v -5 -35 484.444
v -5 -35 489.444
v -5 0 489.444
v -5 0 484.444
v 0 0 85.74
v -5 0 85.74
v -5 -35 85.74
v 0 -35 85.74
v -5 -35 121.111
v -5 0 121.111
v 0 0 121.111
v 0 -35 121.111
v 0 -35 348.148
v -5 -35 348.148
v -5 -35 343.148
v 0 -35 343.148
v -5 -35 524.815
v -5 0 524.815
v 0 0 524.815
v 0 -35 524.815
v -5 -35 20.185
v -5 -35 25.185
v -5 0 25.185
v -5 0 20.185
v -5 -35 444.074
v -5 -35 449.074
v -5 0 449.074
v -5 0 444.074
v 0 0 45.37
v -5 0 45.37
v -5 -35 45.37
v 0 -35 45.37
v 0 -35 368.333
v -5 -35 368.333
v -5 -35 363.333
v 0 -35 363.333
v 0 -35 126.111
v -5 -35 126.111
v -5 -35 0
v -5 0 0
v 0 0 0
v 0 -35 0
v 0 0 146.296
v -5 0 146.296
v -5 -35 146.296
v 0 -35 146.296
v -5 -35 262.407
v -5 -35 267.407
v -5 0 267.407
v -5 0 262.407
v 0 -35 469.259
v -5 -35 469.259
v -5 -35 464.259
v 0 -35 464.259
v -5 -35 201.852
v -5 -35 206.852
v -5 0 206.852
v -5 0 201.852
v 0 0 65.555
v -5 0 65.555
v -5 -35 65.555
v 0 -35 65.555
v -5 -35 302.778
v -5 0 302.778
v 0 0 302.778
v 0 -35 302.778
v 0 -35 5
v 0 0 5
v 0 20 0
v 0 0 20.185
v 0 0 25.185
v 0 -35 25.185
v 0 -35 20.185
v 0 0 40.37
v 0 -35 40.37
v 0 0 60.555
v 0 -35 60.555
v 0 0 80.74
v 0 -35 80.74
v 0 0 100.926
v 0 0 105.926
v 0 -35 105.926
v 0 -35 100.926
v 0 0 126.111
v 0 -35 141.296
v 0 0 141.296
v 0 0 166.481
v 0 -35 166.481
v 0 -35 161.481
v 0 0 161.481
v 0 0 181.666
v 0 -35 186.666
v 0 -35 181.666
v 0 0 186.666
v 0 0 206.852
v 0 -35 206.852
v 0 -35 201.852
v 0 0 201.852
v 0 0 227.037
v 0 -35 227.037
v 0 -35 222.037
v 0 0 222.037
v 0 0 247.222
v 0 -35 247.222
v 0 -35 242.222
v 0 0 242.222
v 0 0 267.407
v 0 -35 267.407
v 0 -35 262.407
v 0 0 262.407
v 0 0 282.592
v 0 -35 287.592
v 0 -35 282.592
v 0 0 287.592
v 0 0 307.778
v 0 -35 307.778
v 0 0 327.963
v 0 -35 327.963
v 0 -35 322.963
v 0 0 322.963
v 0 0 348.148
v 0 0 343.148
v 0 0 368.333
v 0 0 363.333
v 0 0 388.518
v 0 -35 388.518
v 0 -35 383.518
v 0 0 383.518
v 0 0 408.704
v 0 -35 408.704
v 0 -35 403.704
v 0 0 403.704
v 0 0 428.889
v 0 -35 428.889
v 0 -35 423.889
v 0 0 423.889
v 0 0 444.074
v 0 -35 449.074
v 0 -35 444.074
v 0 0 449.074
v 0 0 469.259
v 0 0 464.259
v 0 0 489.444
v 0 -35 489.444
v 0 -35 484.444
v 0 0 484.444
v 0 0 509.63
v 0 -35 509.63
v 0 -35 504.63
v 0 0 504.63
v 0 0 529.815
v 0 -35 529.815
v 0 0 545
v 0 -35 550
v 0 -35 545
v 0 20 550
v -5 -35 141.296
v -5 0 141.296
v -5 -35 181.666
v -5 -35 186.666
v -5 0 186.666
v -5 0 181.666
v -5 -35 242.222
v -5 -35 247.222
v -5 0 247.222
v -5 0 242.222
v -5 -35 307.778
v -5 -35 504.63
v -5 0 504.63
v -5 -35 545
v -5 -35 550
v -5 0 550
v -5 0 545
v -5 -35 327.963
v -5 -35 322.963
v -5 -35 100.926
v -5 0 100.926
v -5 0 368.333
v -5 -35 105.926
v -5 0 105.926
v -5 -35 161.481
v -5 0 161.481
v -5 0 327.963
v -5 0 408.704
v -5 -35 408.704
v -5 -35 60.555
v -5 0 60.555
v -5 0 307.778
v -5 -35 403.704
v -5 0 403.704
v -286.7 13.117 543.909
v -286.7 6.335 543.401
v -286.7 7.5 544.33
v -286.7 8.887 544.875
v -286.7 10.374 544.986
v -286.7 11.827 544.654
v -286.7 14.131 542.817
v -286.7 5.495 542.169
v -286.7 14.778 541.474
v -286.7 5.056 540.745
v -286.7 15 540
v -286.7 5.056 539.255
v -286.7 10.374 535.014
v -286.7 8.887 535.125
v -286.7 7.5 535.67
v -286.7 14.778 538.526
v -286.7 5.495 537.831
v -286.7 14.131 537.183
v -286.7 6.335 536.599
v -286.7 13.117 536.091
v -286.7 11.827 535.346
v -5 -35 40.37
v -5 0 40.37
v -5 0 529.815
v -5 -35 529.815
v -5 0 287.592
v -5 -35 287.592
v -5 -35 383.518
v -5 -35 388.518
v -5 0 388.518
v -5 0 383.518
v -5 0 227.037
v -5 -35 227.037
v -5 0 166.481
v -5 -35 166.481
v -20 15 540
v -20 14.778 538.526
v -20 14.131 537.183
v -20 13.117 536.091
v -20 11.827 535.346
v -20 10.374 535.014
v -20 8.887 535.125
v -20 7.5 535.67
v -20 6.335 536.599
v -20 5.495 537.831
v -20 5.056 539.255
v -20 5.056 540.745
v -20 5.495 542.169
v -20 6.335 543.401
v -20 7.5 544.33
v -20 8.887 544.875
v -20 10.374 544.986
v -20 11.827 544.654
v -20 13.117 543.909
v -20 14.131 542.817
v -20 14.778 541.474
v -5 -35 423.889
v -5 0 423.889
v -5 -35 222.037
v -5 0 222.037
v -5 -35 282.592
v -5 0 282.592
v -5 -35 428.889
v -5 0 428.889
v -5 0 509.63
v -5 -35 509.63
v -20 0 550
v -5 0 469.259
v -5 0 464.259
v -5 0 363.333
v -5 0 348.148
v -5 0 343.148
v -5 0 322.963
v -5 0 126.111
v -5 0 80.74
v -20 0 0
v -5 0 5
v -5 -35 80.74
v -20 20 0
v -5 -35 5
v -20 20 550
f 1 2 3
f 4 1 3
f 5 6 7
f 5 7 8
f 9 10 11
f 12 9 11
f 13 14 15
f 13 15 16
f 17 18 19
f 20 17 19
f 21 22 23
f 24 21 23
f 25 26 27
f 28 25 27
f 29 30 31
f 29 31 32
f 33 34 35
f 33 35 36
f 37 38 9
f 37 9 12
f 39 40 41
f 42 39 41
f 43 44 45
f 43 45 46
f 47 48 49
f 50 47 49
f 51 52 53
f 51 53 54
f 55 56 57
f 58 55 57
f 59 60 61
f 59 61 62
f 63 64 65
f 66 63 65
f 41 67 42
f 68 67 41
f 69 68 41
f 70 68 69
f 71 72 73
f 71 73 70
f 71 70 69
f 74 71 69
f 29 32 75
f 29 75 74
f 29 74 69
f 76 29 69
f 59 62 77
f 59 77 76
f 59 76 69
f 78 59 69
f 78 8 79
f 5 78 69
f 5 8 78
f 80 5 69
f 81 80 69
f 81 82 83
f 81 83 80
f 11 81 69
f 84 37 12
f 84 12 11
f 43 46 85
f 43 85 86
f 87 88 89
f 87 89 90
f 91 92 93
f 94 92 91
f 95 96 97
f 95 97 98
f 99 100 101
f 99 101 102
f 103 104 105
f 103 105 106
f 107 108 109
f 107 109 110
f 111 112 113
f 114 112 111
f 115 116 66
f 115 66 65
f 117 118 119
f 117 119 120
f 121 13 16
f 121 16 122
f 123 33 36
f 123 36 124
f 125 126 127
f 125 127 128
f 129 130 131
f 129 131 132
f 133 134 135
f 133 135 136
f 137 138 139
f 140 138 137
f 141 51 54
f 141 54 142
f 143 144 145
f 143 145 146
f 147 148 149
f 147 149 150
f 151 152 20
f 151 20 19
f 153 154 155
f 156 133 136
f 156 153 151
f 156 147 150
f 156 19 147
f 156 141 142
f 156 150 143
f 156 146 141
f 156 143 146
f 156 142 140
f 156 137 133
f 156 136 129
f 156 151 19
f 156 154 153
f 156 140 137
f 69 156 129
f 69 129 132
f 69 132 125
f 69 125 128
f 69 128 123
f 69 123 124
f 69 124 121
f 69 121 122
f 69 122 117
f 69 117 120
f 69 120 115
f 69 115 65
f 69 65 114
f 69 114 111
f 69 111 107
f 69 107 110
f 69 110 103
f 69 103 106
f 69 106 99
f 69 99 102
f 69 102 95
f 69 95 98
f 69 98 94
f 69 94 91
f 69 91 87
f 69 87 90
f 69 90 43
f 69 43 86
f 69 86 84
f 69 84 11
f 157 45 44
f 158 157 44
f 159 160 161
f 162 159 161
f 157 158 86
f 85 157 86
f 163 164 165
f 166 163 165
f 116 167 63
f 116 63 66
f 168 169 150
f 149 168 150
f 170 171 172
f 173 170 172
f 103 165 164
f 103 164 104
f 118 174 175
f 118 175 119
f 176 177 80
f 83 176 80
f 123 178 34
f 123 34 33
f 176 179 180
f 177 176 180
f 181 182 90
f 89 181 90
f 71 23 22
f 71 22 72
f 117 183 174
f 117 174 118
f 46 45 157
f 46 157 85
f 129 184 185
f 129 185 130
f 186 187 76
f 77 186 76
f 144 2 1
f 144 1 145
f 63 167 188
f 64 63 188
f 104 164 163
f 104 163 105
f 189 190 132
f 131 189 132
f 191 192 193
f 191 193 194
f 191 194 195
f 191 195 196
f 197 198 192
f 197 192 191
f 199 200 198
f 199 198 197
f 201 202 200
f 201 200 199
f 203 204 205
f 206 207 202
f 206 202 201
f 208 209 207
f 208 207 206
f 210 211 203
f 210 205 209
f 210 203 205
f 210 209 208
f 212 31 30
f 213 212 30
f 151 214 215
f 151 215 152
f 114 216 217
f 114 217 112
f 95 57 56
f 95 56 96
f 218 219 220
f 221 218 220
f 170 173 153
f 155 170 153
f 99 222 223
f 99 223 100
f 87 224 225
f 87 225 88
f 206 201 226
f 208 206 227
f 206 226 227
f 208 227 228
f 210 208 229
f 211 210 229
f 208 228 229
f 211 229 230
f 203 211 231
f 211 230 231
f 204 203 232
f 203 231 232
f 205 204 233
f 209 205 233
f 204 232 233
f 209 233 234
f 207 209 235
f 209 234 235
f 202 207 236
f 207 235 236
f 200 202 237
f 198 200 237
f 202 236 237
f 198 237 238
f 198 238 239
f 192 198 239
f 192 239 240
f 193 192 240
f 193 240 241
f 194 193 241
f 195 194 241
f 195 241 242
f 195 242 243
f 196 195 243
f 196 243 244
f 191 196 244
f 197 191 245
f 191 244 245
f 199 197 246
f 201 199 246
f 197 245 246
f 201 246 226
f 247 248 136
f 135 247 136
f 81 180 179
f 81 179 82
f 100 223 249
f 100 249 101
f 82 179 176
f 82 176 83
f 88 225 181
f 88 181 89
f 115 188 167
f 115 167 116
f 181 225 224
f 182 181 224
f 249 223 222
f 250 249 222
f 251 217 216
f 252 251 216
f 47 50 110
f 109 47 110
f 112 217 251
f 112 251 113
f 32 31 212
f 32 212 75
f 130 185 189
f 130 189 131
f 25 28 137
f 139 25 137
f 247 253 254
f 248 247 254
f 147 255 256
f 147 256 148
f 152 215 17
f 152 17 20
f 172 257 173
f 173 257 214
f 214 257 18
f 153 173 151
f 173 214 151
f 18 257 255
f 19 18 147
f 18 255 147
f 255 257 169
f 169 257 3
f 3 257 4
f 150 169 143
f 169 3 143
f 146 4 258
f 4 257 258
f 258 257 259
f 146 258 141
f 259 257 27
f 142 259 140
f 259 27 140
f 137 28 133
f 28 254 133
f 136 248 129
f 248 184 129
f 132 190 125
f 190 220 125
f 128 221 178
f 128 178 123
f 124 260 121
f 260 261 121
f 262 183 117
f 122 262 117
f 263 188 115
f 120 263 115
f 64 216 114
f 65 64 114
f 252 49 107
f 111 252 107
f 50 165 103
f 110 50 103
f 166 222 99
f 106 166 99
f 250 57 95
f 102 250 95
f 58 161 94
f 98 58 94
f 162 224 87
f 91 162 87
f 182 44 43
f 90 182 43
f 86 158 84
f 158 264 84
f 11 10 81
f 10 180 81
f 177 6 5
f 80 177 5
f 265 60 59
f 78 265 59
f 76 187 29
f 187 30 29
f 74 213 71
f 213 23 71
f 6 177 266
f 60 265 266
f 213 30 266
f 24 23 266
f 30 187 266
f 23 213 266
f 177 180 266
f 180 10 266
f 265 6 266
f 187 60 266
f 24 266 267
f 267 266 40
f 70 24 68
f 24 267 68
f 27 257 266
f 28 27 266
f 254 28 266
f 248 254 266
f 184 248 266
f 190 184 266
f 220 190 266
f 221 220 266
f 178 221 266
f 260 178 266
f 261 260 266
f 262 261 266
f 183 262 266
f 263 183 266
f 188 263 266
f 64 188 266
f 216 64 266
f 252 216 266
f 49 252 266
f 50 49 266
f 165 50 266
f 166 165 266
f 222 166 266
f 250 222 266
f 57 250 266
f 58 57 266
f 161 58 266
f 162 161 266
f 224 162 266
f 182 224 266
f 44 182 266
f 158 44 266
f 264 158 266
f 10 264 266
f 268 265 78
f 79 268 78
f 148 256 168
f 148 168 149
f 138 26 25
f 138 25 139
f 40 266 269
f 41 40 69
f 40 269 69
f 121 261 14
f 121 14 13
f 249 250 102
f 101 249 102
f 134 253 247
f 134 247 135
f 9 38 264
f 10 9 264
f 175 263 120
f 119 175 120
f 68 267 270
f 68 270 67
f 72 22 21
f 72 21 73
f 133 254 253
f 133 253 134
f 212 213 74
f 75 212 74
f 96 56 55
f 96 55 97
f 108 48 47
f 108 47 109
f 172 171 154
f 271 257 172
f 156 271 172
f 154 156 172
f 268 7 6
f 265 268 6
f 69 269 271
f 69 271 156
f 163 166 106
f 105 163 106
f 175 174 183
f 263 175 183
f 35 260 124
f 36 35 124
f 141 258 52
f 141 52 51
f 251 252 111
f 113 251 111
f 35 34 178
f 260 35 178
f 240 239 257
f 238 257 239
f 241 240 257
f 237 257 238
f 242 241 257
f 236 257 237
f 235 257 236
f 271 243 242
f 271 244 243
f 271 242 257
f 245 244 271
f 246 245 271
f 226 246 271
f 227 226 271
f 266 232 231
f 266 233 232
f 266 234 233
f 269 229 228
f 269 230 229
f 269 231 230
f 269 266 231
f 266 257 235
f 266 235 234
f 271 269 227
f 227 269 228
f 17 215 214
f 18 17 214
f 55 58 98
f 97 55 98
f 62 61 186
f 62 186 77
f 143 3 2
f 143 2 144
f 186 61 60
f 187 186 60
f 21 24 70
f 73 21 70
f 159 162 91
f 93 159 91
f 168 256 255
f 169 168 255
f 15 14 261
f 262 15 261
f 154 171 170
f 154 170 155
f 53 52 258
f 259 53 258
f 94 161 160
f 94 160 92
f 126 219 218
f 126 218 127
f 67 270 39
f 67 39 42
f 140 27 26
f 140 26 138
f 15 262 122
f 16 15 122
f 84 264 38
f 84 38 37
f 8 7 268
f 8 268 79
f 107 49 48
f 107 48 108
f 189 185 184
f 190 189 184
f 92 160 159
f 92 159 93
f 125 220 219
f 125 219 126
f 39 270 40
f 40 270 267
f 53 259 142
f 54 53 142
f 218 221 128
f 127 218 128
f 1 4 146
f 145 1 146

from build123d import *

# Parameters (mm, degrees)
SKETCH1_W           = 20
SKETCH1_H           = 20
BOSS_EXTRUDE1_DEPTH = 550
SKETCH2_R           = 5
BOSS_EXTRUDE2_DEPTH = 266.7
SKETCH3_W           = 5
SKETCH3_H           = 35
BOSS_EXTRUDE3_DEPTH = 5
LPATTERN1_COUNT     = 28
LPATTERN1_PITCH     = 20.1852


with BuildPart() as part:
    # Sketch1 → Boss-Extrude1 (new body)
    with BuildSketch(Plane.XY):
        with Locations((-10, 10)):
            Rectangle(SKETCH1_W, SKETCH1_H)
    extrude(amount=BOSS_EXTRUDE1_DEPTH)

    # Sketch2 → Boss-Extrude2 (add)
    with BuildSketch(Plane.ZY.offset(20)):
        with Locations(Location((540, 10, 0), (0, 0, 90))):
            Circle(SKETCH2_R)
    extrude(amount=BOSS_EXTRUDE2_DEPTH)

    # Sketch3 → Boss-Extrude3 (add)
    with BuildSketch(Plane.XY.offset(550)):
        with Locations((-2.5, -17.5)):
            Rectangle(SKETCH3_W, SKETCH3_H)
    boss_extrude3 = extrude(amount=-BOSS_EXTRUDE3_DEPTH)

    # LPattern1: Boss-Extrude3 ×28
    with Locations(*[(0, 0, -i * LPATTERN1_PITCH) for i in range(1, LPATTERN1_COUNT)]):
        add(boss_extrude3)


solid = part.part
